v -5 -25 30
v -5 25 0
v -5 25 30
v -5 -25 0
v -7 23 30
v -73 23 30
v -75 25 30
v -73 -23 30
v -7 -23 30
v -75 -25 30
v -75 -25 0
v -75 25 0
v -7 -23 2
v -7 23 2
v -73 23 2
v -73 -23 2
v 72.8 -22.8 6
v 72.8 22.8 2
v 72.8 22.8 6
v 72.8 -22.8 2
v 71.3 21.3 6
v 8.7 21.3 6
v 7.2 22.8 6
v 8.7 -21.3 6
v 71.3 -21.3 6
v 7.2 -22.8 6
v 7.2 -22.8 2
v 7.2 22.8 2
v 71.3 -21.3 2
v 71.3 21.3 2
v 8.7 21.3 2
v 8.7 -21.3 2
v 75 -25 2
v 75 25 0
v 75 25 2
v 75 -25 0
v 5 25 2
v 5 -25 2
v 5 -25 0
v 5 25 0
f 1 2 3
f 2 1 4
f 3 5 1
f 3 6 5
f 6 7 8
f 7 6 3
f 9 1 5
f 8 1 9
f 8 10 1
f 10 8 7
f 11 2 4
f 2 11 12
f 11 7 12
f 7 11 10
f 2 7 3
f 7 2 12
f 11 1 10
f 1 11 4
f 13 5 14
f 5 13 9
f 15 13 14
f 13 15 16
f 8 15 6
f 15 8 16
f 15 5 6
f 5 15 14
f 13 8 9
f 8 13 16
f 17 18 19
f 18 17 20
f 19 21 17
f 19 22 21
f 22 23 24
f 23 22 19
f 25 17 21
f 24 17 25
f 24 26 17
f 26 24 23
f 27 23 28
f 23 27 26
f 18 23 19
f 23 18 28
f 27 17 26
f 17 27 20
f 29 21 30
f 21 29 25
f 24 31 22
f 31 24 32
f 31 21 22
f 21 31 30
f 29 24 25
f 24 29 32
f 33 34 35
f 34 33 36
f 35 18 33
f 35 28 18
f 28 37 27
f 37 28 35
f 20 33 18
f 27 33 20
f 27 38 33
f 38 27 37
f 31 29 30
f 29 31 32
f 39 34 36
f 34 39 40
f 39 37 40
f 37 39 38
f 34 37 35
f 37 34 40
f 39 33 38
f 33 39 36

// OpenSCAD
// Two-part enclosure: open-top box + upside-down lid, printed side by side
// Units: mm

$fn = 64;

// ---------- Box ----------
box_x      = 70;    // box outer length (X)
box_y      = 50;    // box outer width (Y)
box_z      = 30;    // box outer height (Z)
wall       = 2;     // box wall thickness
floor_t    = 2;     // box floor thickness

// ---------- Lid ----------
lid_x      = 70;    // lid plate length (X)
lid_y      = 50;    // lid plate width (Y)
lid_t      = 2;     // lid plate thickness
lip_x      = 65.6;  // lip outer length (X)
lip_y      = 45.6;  // lip outer width (Y)
lip_wall   = 1.5;   // lip wall thickness
lip_h      = 4;     // lip height above plate

// ---------- Layout ----------
gap        = 10;    // gap between parts on the bed
eps        = 0.5;   // cutter overshoot past faces

// Centre the pair on the origin in X
total_x    = box_x + gap + lid_x;
box_cx     = -total_x/2 + box_x/2;          // box centre X
lid_cx     =  total_x/2 - lid_x/2;          // lid centre X (+X side)

// ---------- Part 1: Box ----------
module box() {
    difference() {
        translate([-box_x/2, -box_y/2, 0])
            cube([box_x, box_y, box_z]);
        // inner cavity, open top
        translate([-(box_x - 2*wall)/2, -(box_y - 2*wall)/2, floor_t])
            cube([box_x - 2*wall, box_y - 2*wall, box_z - floor_t + eps]);
    }
}

// ---------- Part 2: Lid (printed upside down) ----------
module lid() {
    union() {
        // plate on the bed
        translate([-lid_x/2, -lid_y/2, 0])
            cube([lid_x, lid_y, lid_t]);
        // rectangular lip on top of plate
        difference() {
            translate([-lip_x/2, -lip_y/2, lid_t - 0.01])
                cube([lip_x, lip_y, lip_h + 0.01]);
            translate([-(lip_x - 2*lip_wall)/2, -(lip_y - 2*lip_wall)/2, lid_t - eps])
                cube([lip_x - 2*lip_wall, lip_y - 2*lip_wall, lip_h + 2*eps]);
        }
    }
}

// ---------- Assembly on the bed ----------
translate([box_cx, 0, 0]) box();
translate([lid_cx, 0, 0]) lid();
